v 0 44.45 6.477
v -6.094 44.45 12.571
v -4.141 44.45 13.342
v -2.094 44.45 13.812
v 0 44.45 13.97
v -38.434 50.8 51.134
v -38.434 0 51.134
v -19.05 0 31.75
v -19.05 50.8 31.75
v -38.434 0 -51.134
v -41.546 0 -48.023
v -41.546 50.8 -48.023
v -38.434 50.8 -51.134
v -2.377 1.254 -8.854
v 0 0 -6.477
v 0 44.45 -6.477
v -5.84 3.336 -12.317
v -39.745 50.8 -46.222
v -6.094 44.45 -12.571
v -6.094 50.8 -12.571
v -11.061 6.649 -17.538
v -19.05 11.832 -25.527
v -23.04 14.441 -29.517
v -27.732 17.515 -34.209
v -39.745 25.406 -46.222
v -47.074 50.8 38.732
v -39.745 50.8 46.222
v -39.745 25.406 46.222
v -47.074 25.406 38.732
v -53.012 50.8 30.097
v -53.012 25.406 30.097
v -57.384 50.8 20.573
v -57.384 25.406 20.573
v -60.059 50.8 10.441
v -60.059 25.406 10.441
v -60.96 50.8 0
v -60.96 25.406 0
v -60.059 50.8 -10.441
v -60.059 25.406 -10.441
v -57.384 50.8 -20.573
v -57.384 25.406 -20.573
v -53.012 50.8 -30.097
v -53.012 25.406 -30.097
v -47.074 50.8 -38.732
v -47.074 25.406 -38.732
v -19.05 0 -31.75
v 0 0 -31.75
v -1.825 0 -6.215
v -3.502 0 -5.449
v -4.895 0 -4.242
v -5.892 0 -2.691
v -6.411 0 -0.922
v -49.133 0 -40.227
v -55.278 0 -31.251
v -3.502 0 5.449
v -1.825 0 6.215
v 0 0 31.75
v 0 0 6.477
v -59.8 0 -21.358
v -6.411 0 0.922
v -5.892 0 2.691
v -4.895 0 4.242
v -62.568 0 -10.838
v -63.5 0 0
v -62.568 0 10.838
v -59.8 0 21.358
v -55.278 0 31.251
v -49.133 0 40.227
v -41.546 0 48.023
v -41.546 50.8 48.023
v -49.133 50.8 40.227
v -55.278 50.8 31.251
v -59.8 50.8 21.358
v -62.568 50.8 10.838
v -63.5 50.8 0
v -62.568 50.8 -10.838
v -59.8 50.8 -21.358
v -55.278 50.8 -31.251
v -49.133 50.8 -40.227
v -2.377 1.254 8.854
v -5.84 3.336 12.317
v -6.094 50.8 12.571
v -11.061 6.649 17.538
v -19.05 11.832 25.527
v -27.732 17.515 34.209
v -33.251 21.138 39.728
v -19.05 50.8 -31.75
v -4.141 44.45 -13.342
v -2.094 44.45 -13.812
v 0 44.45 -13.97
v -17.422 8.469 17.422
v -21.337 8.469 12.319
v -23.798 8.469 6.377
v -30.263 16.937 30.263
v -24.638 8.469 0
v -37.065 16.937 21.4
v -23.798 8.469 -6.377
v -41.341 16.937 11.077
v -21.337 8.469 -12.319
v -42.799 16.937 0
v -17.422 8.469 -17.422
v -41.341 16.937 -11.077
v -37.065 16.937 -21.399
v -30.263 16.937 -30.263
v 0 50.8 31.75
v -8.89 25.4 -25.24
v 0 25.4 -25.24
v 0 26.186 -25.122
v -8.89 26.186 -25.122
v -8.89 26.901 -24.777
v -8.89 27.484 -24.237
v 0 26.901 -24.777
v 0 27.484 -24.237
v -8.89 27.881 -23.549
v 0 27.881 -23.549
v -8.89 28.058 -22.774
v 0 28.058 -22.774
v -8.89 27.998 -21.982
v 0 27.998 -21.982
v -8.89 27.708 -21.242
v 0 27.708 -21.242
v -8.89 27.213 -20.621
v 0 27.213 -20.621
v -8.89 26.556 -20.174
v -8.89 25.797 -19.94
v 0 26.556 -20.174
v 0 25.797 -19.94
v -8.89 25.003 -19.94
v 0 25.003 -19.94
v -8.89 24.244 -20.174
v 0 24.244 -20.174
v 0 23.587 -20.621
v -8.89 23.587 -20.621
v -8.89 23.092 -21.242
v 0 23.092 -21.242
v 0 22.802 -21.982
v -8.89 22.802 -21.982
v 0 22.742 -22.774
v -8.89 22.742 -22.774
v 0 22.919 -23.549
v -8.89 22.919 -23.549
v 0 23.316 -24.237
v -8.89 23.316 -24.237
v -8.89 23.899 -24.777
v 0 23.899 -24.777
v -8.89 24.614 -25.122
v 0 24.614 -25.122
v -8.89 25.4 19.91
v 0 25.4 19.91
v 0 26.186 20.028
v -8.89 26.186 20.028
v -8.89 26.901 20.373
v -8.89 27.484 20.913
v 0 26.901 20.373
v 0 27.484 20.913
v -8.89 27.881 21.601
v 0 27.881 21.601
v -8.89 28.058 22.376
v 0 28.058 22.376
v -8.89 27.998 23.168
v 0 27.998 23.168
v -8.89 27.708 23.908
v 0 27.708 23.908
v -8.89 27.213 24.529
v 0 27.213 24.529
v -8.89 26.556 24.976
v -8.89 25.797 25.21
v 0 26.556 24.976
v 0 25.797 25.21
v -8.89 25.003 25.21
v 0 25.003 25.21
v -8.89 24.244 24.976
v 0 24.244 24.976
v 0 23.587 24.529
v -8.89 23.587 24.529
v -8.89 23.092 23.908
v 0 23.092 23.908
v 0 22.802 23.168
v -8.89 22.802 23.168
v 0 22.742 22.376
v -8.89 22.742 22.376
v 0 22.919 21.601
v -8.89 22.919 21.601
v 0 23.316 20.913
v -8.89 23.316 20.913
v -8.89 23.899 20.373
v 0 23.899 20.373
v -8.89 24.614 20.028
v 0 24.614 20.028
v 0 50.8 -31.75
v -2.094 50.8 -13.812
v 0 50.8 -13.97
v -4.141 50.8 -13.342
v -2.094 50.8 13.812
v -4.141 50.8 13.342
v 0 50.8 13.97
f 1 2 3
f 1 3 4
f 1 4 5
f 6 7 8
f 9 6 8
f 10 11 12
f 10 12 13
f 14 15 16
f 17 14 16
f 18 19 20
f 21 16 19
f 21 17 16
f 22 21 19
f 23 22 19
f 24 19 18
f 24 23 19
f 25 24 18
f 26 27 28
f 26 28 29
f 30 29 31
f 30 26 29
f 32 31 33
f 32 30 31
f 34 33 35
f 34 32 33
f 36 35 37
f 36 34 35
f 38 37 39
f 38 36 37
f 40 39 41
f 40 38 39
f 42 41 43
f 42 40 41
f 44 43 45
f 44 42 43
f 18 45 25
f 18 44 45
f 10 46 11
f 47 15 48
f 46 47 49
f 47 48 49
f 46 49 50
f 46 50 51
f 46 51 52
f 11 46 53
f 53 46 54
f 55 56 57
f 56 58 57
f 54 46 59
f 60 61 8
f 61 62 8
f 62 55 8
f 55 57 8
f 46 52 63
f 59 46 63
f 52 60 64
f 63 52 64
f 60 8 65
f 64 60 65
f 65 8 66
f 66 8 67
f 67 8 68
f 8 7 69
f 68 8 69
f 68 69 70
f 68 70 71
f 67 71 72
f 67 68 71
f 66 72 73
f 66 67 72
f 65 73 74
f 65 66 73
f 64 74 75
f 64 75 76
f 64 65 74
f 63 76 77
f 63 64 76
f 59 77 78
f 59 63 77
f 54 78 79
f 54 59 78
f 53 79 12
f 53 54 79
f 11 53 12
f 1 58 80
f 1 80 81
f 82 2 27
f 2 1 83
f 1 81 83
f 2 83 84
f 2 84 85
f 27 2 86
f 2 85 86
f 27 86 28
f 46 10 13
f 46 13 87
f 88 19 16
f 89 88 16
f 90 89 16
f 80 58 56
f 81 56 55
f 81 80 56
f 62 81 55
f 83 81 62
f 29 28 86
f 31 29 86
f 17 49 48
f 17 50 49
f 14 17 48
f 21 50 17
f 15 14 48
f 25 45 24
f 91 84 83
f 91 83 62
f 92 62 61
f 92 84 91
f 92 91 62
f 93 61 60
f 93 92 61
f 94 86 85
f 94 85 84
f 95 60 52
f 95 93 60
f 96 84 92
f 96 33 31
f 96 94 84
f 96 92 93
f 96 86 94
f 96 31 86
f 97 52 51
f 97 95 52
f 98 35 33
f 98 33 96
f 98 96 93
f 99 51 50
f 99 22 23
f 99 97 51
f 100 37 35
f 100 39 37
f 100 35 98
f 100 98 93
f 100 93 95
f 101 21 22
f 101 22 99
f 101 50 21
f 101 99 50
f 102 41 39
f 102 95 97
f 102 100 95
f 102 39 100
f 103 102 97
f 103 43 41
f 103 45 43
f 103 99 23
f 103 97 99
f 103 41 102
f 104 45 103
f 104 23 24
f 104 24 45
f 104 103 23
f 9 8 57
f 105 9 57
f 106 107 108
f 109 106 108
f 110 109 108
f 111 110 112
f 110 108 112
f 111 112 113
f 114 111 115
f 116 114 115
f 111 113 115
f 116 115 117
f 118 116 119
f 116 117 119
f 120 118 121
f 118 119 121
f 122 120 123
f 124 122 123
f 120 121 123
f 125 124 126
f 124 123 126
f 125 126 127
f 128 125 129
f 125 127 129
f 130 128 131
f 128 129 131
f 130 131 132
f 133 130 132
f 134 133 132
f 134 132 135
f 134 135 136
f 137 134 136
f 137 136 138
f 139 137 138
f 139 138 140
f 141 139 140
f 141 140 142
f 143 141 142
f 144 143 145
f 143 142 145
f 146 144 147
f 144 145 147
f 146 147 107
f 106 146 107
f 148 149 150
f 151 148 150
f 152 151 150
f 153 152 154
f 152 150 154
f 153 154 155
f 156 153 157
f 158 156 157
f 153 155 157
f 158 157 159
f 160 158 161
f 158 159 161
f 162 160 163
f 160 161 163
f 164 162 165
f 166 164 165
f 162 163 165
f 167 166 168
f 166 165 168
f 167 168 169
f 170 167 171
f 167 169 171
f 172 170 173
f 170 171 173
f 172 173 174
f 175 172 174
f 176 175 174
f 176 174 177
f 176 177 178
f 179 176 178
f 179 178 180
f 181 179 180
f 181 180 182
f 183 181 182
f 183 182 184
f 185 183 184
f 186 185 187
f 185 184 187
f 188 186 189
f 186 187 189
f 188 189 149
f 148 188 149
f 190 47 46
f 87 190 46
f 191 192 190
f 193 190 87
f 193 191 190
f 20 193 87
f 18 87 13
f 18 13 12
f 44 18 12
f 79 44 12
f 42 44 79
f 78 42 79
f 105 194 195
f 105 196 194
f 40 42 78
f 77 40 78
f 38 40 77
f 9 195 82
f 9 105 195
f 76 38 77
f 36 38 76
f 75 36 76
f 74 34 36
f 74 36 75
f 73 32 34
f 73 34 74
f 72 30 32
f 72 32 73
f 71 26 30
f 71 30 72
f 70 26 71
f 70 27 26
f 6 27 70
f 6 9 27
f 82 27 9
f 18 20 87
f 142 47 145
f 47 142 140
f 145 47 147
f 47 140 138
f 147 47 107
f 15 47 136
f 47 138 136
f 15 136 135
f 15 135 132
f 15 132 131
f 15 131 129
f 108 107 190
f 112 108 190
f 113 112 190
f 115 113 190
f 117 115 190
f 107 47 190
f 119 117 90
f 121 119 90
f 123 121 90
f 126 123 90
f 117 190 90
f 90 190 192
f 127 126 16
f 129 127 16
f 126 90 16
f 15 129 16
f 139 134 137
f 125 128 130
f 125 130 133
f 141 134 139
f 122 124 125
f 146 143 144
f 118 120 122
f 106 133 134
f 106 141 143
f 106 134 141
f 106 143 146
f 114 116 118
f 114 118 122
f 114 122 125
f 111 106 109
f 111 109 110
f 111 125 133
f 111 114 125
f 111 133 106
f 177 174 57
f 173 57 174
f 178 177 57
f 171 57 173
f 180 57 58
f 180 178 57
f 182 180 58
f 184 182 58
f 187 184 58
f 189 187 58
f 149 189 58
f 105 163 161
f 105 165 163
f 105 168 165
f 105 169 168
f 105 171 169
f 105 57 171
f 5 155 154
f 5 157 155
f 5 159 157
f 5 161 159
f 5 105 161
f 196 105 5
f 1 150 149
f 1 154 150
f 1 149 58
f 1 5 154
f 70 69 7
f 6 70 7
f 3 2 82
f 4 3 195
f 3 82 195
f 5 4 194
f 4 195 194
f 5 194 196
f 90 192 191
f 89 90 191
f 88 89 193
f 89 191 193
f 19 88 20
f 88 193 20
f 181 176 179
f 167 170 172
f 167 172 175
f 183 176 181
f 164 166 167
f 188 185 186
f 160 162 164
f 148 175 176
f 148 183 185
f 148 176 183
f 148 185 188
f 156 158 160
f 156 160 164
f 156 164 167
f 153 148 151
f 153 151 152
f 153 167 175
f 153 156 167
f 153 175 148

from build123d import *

# Parameters (mm, degrees)
REVOLVE1_ANGLE           = 90
REVOLVE1_OTHER_WAY_ANGLE = 90
BOSS_EXTRUDE3_DEPTH      = 50.8
CUT_EXTRUDE1_REACH       = 105.175
BOSS_EXTRUDE4_DEPTH      = 50.8
SKETCH6_R                = 13.97
CUT_EXTRUDE2_DEPTH       = 6.35
SKETCH7_R                = 2.665
CUT_EXTRUDE3_DEPTH       = 8.89


with BuildPart() as part:
    # Sketch1 → Revolve1 (revolve)
    with BuildSketch(Plane.XY):
        Polygon((-63.5, 50.8), (-63.5, 0), (-6.477, 0), (-60.96, 25.405840139), (-60.96, 50.8), align=None)
    revolve(axis=Axis((0, 0, 0), (0, 1, 0)), revolution_arc=REVOLVE1_ANGLE)

    # Sketch1 → Revolve1 other way (revolve)
    with BuildSketch(Plane.XY):
        Polygon((-63.5, 50.8), (-63.5, 0), (-6.477, 0), (-60.96, 25.405840139), (-60.96, 50.8), align=None)
    revolve(axis=Axis((0, 0, 0), (0, -1, 0)), revolution_arc=REVOLVE1_OTHER_WAY_ANGLE)

    # Sketch4 → Boss-Extrude3 (add)
    with BuildSketch(Plane(origin=(0, 0, 0), x_dir=(-1, 0, 0), z_dir=(0, -1, 0))):
        Polygon((19.05, 31.75), (0, 31.75), (0, 6.477), (19.05, 25.527), align=None)
        Polygon((19.05, -25.527), (0, -6.477), (0, -31.75), (19.05, -31.75), align=None)
    extrude(amount=-BOSS_EXTRUDE3_DEPTH)

    # Sketch4<3> → Cut-Extrude1 (cut, up to next)
    with BuildSketch(Plane(origin=(0, 0, 0), x_dir=(-1, 0, 0), z_dir=(0, -1, 0)), mode=Mode.PRIVATE) as cut_extrude1_sk1:
        with BuildLine():
            Line((0, 63.5), (0, 31.75))
            Line((0, 31.75), (19.05, 31.75))
            Line((19.05, 31.75), (19.05, 25.527))
            Line((19.05, 25.527), (41.545840095, 48.022840095))
            ThreePointArc((41.545840095, 48.022840095), (22.16753994, 59.505043257), (0, 63.5))
        make_face()
    cut_extrude1_tool1 = extrude(cut_extrude1_sk1.sketch, amount=-CUT_EXTRUDE1_REACH, mode=Mode.PRIVATE) & part.part
    # Sketch4<3> → Cut-Extrude1 (cut, up to next)
    with BuildSketch(Plane(origin=(0, 0, 0), x_dir=(-1, 0, 0), z_dir=(0, -1, 0)), mode=Mode.PRIVATE) as cut_extrude1_sk2:
        with BuildLine():
            Line((19.05, -31.75), (0, -31.75))
            Line((0, -31.75), (0, -63.5))
            ThreePointArc((0, -63.5), (22.16753994, -59.505043257), (41.545840095, -48.022840095))
            Line((41.545840095, -48.022840095), (19.05, -25.527))
            Line((19.05, -25.527), (19.05, -31.75))
        make_face()
    cut_extrude1_tool2 = extrude(cut_extrude1_sk2.sketch, amount=-CUT_EXTRUDE1_REACH, mode=Mode.PRIVATE) & part.part
    add(cut_extrude1_tool1.solids().sort_by_distance((-16.601878, 0, -46.365556))[0], mode=Mode.SUBTRACT)
    add(cut_extrude1_tool2.solids().sort_by_distance((-16.601878, 0, 46.365556))[0], mode=Mode.SUBTRACT)

    # Sketch5 → Boss-Extrude4 (add)
    with BuildSketch(Plane.XZ):
        Polygon((-41.545840095, 48.022840095), (-38.434340095, 51.134340095), (-19.05, 31.75), (-19.05, 25.527), align=None)
        Polygon((-41.545840095, -48.022840095), (-38.434340095, -51.134340095), (-19.05, -31.75), (-19.05, -25.527), align=None)
    extrude(amount=-BOSS_EXTRUDE4_DEPTH)

    # Sketch6 → Cut-Extrude2 (cut)
    with BuildSketch(Plane(origin=(0, 50.8, 0), x_dir=(1, 0, 0), z_dir=(0, 1, 0))):
        Circle(SKETCH6_R)
    extrude(amount=-CUT_EXTRUDE2_DEPTH, mode=Mode.SUBTRACT)

    # Sketch7 → Cut-Extrude3 (cut)
    with BuildSketch(Plane(origin=(0, 0, 0), x_dir=(0, 0, -1), z_dir=(1, 0, 0))):
        with Locations((-22.575, 25.4)):
            Circle(SKETCH7_R)
        with Locations((22.575, 25.4)):
            Circle(SKETCH7_R)
    extrude(amount=-CUT_EXTRUDE3_DEPTH, mode=Mode.SUBTRACT)


solid = part.part
